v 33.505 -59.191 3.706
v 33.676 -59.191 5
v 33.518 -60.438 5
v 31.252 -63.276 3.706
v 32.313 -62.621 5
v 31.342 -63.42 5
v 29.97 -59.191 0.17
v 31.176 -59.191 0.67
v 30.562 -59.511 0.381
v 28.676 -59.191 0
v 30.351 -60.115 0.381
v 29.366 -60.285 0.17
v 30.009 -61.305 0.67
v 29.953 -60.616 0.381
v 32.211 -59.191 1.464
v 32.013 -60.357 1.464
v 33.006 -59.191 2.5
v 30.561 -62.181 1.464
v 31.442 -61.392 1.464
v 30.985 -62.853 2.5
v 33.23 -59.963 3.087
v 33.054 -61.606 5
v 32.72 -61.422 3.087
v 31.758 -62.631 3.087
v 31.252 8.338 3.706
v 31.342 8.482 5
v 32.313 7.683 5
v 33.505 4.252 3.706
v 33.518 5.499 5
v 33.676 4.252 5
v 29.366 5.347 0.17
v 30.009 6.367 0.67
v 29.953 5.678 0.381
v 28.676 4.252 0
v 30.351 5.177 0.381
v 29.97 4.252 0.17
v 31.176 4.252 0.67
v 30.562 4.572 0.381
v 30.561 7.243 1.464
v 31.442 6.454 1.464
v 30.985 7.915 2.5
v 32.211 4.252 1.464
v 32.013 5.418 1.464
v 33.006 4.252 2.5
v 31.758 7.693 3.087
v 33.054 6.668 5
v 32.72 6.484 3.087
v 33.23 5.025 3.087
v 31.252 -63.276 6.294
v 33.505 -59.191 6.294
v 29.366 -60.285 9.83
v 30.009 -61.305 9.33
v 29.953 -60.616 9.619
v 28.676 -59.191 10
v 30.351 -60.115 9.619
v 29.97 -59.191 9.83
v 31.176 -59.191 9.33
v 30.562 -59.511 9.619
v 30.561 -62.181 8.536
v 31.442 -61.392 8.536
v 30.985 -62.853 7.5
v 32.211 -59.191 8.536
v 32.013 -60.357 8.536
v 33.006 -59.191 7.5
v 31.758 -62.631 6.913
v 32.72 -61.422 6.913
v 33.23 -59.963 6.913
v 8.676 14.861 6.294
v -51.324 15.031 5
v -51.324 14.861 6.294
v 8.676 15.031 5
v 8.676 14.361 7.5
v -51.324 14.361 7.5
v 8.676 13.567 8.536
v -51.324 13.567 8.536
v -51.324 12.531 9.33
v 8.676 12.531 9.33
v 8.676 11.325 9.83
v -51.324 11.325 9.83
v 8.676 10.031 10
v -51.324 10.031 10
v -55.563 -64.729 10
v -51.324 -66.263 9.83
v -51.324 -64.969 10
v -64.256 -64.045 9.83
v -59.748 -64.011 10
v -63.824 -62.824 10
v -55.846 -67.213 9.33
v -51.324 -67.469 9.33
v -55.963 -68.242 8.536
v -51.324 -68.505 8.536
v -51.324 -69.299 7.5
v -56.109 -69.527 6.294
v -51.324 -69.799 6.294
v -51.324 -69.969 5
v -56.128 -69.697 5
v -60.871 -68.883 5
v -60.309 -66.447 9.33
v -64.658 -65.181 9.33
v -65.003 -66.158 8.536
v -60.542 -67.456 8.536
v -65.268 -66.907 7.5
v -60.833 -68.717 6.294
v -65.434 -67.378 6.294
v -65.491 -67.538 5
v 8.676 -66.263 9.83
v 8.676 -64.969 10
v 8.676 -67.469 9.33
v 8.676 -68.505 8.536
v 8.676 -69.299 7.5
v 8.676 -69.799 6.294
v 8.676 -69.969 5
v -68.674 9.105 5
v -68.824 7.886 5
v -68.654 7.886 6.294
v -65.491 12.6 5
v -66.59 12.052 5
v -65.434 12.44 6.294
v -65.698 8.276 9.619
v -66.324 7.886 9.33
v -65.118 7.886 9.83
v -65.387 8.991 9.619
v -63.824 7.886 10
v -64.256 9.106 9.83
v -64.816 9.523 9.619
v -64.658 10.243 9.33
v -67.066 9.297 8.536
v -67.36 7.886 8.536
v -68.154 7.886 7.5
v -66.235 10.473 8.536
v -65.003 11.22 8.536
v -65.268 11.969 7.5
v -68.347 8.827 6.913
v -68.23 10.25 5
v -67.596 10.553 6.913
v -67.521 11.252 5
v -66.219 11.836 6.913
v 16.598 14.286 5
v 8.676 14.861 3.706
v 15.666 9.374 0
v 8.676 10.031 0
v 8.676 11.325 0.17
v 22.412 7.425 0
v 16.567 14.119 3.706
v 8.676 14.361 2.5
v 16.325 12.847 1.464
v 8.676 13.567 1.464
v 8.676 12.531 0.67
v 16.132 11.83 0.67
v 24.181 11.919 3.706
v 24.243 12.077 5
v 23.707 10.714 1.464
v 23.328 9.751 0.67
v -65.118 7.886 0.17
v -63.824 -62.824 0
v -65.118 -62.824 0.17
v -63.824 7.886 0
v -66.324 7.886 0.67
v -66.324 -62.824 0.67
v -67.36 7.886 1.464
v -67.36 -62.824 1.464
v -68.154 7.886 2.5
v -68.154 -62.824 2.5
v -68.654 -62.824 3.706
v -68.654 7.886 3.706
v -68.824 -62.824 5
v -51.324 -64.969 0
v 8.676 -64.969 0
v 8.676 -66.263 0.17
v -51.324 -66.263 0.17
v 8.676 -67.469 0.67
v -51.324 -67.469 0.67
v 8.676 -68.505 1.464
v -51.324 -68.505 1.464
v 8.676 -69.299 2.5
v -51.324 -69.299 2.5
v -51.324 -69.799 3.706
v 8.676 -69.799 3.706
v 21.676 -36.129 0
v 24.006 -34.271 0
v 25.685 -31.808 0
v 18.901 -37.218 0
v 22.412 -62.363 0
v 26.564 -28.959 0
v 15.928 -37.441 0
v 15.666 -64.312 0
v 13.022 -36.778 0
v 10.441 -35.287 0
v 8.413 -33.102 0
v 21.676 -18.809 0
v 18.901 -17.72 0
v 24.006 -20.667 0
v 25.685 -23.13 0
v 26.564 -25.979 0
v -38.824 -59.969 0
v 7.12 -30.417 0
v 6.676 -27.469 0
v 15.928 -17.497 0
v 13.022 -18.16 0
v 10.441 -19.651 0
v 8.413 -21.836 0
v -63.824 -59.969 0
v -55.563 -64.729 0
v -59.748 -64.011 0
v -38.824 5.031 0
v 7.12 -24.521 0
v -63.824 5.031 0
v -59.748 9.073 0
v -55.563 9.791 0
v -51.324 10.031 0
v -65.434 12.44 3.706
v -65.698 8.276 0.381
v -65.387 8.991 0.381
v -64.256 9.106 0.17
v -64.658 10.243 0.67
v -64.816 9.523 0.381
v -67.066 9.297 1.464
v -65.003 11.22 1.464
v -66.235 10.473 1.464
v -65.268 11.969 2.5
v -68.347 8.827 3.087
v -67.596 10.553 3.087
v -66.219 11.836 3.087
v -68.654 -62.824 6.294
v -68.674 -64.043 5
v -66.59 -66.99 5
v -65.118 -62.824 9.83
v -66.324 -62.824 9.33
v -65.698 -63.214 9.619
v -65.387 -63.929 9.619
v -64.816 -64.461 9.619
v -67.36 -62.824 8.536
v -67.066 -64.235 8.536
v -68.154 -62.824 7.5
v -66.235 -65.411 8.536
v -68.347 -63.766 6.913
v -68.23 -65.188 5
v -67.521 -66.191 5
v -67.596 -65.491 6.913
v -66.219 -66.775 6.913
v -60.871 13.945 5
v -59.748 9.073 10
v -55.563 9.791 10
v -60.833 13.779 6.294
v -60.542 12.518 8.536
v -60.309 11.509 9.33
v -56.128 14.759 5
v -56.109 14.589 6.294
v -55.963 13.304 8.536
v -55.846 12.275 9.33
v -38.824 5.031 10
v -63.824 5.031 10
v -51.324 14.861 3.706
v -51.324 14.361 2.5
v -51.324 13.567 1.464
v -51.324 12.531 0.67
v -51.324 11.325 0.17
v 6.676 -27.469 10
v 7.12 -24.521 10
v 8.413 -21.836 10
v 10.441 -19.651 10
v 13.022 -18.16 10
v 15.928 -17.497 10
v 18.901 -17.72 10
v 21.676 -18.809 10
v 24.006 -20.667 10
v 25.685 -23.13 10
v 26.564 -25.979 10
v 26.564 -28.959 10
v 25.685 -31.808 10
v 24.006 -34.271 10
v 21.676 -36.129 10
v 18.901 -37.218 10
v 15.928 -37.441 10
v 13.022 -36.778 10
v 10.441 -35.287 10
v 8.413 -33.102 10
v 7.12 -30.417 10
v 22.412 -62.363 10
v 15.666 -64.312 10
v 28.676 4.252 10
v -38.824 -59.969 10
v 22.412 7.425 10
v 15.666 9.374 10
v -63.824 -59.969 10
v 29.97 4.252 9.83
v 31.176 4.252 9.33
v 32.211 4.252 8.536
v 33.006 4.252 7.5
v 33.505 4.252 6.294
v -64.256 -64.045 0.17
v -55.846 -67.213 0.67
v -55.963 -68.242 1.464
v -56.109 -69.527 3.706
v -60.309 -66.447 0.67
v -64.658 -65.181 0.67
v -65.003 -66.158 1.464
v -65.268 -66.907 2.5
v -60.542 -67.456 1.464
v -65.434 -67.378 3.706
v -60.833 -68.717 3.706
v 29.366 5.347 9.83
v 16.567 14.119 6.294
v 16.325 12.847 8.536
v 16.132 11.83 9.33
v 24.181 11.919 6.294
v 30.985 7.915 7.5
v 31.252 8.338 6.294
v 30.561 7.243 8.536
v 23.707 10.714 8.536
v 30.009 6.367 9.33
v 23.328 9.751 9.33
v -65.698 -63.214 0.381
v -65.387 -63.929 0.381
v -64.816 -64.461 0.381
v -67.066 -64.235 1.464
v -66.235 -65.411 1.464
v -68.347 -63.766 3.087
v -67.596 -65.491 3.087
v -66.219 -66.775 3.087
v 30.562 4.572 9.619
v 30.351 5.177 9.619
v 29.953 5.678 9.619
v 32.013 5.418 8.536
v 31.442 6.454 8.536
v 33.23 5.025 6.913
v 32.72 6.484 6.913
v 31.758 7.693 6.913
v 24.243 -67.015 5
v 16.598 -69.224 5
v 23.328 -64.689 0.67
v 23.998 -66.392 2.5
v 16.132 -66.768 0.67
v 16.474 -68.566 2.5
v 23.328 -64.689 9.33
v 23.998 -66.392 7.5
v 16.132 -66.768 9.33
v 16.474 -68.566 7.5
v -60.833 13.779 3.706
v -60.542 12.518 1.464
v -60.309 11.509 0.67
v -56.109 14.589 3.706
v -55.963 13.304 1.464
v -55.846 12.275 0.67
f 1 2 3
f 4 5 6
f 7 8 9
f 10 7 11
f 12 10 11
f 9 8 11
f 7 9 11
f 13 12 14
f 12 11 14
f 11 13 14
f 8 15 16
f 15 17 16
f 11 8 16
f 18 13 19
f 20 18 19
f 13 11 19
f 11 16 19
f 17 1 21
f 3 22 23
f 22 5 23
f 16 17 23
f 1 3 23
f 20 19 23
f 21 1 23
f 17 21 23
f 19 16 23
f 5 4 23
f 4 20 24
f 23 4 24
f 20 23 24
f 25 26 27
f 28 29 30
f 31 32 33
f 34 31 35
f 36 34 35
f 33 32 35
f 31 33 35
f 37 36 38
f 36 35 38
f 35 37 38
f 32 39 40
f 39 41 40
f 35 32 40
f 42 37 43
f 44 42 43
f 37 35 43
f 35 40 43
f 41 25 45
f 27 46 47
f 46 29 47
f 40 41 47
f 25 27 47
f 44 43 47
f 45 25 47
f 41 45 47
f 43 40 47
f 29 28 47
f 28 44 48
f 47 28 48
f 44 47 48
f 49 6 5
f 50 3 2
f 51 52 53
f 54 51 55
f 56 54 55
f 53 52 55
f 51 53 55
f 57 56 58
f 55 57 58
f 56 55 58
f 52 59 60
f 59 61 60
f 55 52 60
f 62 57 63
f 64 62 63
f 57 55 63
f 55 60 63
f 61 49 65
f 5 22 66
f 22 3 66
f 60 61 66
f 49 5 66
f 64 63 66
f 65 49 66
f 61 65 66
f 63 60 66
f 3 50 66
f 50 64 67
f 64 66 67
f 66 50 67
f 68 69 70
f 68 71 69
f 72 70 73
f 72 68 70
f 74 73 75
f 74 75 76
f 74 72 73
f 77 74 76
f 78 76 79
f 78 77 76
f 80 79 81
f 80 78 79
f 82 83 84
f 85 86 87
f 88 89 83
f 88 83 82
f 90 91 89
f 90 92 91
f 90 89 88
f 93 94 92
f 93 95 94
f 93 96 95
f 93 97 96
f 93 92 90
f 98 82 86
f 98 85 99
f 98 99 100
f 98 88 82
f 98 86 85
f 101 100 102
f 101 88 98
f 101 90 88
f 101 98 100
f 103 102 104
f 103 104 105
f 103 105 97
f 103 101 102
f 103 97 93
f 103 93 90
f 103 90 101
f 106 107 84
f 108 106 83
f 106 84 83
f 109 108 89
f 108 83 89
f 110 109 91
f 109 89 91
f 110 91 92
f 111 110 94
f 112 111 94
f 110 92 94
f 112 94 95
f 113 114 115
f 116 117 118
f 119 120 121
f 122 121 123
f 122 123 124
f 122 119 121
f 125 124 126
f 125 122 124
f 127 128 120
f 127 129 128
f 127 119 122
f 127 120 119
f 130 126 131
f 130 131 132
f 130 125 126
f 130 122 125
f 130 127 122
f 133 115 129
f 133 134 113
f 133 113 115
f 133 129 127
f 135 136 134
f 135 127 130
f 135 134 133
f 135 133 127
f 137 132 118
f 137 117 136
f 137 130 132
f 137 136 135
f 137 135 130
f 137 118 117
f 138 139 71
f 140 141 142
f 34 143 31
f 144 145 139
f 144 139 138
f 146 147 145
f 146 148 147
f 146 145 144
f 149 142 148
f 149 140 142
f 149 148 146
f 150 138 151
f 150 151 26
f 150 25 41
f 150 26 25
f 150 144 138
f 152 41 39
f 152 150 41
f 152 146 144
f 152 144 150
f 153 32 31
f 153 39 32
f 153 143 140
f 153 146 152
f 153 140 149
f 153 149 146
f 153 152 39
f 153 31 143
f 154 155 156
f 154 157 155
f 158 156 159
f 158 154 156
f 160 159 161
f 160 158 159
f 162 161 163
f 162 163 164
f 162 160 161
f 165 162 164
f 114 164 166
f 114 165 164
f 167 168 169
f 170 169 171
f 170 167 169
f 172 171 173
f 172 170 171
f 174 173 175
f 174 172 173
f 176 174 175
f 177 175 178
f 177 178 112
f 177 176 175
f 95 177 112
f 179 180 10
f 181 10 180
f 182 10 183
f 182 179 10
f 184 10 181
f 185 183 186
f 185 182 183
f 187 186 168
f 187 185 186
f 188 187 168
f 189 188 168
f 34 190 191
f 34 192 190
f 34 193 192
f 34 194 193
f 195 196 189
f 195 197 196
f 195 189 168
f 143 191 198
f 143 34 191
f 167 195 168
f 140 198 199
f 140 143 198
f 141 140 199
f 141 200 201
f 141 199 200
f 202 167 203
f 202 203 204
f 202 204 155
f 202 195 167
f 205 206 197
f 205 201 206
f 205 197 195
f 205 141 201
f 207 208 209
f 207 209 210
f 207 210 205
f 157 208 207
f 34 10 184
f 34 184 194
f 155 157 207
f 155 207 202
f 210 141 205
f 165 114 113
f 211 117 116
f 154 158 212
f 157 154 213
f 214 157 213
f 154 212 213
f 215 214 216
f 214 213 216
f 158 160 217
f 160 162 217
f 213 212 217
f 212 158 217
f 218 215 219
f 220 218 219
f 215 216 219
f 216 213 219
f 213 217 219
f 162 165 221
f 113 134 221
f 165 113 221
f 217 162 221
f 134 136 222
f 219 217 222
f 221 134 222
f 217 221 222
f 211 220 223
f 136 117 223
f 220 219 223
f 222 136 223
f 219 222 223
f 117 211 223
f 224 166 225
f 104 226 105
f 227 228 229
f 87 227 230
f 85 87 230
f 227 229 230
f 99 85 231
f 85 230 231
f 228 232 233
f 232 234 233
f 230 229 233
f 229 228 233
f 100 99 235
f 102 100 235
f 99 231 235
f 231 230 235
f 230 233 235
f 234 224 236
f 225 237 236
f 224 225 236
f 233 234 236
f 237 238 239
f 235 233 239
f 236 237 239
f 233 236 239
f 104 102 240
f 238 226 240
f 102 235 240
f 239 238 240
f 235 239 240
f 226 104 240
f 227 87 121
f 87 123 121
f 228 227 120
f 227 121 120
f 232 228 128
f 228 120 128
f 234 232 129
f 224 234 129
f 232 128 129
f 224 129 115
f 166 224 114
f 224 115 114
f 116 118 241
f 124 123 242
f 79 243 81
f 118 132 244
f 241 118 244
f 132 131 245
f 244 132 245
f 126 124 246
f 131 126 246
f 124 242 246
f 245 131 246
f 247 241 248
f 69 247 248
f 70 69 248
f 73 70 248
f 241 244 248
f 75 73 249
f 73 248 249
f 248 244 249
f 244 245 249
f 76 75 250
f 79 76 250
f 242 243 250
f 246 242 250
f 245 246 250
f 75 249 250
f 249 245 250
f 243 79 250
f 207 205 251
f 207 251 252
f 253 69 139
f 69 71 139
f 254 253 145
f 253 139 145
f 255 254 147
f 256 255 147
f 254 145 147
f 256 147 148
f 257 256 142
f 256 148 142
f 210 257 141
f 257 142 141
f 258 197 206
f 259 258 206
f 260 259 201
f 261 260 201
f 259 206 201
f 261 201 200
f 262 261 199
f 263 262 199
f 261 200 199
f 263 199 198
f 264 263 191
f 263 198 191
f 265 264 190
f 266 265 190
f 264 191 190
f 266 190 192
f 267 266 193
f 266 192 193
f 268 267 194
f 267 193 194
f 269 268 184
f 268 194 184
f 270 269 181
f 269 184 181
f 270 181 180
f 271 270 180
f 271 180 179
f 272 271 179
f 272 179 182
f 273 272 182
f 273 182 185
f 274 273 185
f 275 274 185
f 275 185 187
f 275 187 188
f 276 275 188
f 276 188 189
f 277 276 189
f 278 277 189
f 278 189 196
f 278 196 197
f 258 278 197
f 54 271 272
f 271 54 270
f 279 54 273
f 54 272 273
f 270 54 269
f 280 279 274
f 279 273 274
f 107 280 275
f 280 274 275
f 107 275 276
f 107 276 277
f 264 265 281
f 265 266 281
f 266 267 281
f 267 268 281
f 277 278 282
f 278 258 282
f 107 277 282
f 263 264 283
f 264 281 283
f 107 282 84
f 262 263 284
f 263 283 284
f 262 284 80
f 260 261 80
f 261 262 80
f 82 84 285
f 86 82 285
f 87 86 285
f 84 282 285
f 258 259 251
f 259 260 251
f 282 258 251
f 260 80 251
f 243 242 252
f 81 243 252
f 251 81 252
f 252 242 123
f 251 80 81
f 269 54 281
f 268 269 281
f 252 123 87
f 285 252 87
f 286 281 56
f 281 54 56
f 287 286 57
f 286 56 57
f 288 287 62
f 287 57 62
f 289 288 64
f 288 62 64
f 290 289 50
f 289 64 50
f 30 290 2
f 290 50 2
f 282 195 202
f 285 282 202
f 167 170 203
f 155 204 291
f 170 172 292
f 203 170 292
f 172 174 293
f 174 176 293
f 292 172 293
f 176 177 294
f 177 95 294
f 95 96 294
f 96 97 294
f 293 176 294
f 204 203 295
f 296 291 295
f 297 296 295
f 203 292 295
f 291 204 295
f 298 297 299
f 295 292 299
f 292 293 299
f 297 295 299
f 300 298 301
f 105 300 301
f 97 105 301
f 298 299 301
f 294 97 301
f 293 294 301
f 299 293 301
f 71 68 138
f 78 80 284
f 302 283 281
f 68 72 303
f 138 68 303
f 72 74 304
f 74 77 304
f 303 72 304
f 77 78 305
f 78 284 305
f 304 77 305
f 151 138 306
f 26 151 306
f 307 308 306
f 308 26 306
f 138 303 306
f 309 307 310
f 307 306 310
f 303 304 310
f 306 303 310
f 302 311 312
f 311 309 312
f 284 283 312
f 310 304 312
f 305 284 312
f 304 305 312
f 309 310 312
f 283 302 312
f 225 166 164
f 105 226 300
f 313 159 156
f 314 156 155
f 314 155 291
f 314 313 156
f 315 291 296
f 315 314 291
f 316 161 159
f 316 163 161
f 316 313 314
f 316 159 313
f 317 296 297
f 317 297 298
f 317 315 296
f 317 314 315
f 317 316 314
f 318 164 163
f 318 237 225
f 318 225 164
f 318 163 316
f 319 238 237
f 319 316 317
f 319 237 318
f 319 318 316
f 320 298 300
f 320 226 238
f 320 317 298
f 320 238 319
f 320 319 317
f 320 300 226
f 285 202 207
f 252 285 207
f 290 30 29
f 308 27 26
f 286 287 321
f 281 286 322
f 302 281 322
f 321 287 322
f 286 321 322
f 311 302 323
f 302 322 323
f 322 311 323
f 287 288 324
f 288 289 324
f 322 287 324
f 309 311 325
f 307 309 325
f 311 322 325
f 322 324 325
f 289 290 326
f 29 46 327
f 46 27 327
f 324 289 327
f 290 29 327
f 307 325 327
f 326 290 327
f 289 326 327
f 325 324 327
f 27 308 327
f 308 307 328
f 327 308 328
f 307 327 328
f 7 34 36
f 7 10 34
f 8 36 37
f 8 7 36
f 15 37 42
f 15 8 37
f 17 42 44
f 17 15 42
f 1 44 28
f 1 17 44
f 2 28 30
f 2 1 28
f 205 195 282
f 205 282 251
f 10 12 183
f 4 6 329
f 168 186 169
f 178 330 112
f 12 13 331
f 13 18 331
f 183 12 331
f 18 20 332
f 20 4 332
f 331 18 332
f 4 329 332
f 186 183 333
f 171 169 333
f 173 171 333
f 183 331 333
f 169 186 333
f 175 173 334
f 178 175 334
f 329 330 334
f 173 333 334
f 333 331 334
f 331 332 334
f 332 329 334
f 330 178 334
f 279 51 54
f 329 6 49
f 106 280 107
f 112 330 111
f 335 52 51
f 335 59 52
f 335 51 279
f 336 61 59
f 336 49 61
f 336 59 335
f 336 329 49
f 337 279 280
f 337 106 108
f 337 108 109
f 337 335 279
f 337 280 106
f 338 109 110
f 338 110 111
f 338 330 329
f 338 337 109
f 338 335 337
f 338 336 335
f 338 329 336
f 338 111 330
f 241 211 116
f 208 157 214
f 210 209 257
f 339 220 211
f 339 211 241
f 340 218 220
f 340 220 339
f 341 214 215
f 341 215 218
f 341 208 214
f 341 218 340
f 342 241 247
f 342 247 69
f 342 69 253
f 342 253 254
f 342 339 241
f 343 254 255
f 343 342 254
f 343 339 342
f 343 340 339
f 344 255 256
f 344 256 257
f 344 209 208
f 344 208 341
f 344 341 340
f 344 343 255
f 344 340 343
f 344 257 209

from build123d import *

# Parameters (mm, degrees)
BOSS_EXTRUDE1_DEPTH = 10
SKETCH2_W           = 25
SKETCH2_H           = 65
CUT_EXTRUDE2_DEPTH  = 20
SKETCH3_R           = 10
CUT_EXTRUDE3_DEPTH  = 20
FILLET2_R           = 5


with BuildPart() as part:
    # Sketch1 → Boss-Extrude1 (new body)
    with BuildSketch(Plane.XY):
        with BuildLine():
            Line((-51.324273213, 15.030948404), (8.675726787, 15.030948404))
            ThreePointArc((8.675726787, 15.030948404), (21.820193251, 12.947195155), (33.675726787, 6.900266117))
            Line((33.675726787, 6.900266117), (33.675726787, -61.838369308))
            ThreePointArc((33.675726787, -61.838369308), (21.820193251, -67.885298346), (8.675726787, -69.969051596))
            Line((8.675726787, -69.969051596), (-51.324273213, -69.969051596))
            ThreePointArc((-51.324273213, -69.969051596), (-60.275029546, -69.015819954), (-68.824273213, -66.198885058))
            Line((-68.824273213, -66.198885058), (-68.824273213, 11.260781867))
            ThreePointArc((-68.824273213, 11.260781867), (-60.275029546, 14.077716763), (-51.324273213, 15.030948404))
        make_face()
    extrude(amount=BOSS_EXTRUDE1_DEPTH)

    # Sketch2 → Cut-Extrude2 (cut)
    with BuildSketch(Plane(origin=(0, 0, 0), x_dir=(-1, 0, 0), z_dir=(0, 0, -1))):
        with Locations((51.324273213, -27.469051596)):
            Rectangle(SKETCH2_W, SKETCH2_H)
    extrude(amount=-CUT_EXTRUDE2_DEPTH, mode=Mode.SUBTRACT)

    # Sketch3 → Cut-Extrude3 (cut)
    with BuildSketch(Plane(origin=(0, 0, 0), x_dir=(-1, 0, 0), z_dir=(0, 0, -1))):
        with Locations((-16.675726787, -27.469051596)):
            Circle(SKETCH3_R)
    extrude(amount=-CUT_EXTRUDE3_DEPTH, mode=Mode.SUBTRACT)

    # Fillet2
    fillet2_edges = [part.edges().sort_by_distance(p)[0] for p in [
        (21.820193251, 12.947195155, 10),
        (33.675726787, -27.469051596, 0),
        (21.820193251, -67.885298346, 0),
        (-21.324273213, 15.030948404, 10),
        (8.675726787, -69.969051596, 5),
        (-51.324273213, -69.969051596, 5),
        (-68.824273213, -66.198885058, 5),
        (-68.824273213, 11.260781867, 5),
        (-51.324273213, 15.030948404, 5),
        (8.675726787, 15.030948404, 5),
        (33.675726787, 6.900266117, 5),
        (33.675726787, -61.838369308, 5),
        (-60.275029546, 14.077716763, 10),
        (-68.824273213, -27.469051596, 10),
        (-60.275029546, -69.015819954, 10),
        (-21.324273213, -69.969051596, 10),
        (21.820193251, -67.885298346, 10),
        (33.675726787, -27.469051596, 10),
        (-21.324273213, -69.969051596, 0),
        (-60.275029546, -69.015819954, 0),
        (-68.824273213, -27.469051596, 0),
        (-60.275029546, 14.077716763, 0),
        (-21.324273213, 15.030948404, 0),
        (21.820193251, 12.947195155, 0),
    ]]
    fillet(fillet2_edges, radius=FILLET2_R - 0.0001)  # a hair under: the kernel refuses the full size


solid = part.part
